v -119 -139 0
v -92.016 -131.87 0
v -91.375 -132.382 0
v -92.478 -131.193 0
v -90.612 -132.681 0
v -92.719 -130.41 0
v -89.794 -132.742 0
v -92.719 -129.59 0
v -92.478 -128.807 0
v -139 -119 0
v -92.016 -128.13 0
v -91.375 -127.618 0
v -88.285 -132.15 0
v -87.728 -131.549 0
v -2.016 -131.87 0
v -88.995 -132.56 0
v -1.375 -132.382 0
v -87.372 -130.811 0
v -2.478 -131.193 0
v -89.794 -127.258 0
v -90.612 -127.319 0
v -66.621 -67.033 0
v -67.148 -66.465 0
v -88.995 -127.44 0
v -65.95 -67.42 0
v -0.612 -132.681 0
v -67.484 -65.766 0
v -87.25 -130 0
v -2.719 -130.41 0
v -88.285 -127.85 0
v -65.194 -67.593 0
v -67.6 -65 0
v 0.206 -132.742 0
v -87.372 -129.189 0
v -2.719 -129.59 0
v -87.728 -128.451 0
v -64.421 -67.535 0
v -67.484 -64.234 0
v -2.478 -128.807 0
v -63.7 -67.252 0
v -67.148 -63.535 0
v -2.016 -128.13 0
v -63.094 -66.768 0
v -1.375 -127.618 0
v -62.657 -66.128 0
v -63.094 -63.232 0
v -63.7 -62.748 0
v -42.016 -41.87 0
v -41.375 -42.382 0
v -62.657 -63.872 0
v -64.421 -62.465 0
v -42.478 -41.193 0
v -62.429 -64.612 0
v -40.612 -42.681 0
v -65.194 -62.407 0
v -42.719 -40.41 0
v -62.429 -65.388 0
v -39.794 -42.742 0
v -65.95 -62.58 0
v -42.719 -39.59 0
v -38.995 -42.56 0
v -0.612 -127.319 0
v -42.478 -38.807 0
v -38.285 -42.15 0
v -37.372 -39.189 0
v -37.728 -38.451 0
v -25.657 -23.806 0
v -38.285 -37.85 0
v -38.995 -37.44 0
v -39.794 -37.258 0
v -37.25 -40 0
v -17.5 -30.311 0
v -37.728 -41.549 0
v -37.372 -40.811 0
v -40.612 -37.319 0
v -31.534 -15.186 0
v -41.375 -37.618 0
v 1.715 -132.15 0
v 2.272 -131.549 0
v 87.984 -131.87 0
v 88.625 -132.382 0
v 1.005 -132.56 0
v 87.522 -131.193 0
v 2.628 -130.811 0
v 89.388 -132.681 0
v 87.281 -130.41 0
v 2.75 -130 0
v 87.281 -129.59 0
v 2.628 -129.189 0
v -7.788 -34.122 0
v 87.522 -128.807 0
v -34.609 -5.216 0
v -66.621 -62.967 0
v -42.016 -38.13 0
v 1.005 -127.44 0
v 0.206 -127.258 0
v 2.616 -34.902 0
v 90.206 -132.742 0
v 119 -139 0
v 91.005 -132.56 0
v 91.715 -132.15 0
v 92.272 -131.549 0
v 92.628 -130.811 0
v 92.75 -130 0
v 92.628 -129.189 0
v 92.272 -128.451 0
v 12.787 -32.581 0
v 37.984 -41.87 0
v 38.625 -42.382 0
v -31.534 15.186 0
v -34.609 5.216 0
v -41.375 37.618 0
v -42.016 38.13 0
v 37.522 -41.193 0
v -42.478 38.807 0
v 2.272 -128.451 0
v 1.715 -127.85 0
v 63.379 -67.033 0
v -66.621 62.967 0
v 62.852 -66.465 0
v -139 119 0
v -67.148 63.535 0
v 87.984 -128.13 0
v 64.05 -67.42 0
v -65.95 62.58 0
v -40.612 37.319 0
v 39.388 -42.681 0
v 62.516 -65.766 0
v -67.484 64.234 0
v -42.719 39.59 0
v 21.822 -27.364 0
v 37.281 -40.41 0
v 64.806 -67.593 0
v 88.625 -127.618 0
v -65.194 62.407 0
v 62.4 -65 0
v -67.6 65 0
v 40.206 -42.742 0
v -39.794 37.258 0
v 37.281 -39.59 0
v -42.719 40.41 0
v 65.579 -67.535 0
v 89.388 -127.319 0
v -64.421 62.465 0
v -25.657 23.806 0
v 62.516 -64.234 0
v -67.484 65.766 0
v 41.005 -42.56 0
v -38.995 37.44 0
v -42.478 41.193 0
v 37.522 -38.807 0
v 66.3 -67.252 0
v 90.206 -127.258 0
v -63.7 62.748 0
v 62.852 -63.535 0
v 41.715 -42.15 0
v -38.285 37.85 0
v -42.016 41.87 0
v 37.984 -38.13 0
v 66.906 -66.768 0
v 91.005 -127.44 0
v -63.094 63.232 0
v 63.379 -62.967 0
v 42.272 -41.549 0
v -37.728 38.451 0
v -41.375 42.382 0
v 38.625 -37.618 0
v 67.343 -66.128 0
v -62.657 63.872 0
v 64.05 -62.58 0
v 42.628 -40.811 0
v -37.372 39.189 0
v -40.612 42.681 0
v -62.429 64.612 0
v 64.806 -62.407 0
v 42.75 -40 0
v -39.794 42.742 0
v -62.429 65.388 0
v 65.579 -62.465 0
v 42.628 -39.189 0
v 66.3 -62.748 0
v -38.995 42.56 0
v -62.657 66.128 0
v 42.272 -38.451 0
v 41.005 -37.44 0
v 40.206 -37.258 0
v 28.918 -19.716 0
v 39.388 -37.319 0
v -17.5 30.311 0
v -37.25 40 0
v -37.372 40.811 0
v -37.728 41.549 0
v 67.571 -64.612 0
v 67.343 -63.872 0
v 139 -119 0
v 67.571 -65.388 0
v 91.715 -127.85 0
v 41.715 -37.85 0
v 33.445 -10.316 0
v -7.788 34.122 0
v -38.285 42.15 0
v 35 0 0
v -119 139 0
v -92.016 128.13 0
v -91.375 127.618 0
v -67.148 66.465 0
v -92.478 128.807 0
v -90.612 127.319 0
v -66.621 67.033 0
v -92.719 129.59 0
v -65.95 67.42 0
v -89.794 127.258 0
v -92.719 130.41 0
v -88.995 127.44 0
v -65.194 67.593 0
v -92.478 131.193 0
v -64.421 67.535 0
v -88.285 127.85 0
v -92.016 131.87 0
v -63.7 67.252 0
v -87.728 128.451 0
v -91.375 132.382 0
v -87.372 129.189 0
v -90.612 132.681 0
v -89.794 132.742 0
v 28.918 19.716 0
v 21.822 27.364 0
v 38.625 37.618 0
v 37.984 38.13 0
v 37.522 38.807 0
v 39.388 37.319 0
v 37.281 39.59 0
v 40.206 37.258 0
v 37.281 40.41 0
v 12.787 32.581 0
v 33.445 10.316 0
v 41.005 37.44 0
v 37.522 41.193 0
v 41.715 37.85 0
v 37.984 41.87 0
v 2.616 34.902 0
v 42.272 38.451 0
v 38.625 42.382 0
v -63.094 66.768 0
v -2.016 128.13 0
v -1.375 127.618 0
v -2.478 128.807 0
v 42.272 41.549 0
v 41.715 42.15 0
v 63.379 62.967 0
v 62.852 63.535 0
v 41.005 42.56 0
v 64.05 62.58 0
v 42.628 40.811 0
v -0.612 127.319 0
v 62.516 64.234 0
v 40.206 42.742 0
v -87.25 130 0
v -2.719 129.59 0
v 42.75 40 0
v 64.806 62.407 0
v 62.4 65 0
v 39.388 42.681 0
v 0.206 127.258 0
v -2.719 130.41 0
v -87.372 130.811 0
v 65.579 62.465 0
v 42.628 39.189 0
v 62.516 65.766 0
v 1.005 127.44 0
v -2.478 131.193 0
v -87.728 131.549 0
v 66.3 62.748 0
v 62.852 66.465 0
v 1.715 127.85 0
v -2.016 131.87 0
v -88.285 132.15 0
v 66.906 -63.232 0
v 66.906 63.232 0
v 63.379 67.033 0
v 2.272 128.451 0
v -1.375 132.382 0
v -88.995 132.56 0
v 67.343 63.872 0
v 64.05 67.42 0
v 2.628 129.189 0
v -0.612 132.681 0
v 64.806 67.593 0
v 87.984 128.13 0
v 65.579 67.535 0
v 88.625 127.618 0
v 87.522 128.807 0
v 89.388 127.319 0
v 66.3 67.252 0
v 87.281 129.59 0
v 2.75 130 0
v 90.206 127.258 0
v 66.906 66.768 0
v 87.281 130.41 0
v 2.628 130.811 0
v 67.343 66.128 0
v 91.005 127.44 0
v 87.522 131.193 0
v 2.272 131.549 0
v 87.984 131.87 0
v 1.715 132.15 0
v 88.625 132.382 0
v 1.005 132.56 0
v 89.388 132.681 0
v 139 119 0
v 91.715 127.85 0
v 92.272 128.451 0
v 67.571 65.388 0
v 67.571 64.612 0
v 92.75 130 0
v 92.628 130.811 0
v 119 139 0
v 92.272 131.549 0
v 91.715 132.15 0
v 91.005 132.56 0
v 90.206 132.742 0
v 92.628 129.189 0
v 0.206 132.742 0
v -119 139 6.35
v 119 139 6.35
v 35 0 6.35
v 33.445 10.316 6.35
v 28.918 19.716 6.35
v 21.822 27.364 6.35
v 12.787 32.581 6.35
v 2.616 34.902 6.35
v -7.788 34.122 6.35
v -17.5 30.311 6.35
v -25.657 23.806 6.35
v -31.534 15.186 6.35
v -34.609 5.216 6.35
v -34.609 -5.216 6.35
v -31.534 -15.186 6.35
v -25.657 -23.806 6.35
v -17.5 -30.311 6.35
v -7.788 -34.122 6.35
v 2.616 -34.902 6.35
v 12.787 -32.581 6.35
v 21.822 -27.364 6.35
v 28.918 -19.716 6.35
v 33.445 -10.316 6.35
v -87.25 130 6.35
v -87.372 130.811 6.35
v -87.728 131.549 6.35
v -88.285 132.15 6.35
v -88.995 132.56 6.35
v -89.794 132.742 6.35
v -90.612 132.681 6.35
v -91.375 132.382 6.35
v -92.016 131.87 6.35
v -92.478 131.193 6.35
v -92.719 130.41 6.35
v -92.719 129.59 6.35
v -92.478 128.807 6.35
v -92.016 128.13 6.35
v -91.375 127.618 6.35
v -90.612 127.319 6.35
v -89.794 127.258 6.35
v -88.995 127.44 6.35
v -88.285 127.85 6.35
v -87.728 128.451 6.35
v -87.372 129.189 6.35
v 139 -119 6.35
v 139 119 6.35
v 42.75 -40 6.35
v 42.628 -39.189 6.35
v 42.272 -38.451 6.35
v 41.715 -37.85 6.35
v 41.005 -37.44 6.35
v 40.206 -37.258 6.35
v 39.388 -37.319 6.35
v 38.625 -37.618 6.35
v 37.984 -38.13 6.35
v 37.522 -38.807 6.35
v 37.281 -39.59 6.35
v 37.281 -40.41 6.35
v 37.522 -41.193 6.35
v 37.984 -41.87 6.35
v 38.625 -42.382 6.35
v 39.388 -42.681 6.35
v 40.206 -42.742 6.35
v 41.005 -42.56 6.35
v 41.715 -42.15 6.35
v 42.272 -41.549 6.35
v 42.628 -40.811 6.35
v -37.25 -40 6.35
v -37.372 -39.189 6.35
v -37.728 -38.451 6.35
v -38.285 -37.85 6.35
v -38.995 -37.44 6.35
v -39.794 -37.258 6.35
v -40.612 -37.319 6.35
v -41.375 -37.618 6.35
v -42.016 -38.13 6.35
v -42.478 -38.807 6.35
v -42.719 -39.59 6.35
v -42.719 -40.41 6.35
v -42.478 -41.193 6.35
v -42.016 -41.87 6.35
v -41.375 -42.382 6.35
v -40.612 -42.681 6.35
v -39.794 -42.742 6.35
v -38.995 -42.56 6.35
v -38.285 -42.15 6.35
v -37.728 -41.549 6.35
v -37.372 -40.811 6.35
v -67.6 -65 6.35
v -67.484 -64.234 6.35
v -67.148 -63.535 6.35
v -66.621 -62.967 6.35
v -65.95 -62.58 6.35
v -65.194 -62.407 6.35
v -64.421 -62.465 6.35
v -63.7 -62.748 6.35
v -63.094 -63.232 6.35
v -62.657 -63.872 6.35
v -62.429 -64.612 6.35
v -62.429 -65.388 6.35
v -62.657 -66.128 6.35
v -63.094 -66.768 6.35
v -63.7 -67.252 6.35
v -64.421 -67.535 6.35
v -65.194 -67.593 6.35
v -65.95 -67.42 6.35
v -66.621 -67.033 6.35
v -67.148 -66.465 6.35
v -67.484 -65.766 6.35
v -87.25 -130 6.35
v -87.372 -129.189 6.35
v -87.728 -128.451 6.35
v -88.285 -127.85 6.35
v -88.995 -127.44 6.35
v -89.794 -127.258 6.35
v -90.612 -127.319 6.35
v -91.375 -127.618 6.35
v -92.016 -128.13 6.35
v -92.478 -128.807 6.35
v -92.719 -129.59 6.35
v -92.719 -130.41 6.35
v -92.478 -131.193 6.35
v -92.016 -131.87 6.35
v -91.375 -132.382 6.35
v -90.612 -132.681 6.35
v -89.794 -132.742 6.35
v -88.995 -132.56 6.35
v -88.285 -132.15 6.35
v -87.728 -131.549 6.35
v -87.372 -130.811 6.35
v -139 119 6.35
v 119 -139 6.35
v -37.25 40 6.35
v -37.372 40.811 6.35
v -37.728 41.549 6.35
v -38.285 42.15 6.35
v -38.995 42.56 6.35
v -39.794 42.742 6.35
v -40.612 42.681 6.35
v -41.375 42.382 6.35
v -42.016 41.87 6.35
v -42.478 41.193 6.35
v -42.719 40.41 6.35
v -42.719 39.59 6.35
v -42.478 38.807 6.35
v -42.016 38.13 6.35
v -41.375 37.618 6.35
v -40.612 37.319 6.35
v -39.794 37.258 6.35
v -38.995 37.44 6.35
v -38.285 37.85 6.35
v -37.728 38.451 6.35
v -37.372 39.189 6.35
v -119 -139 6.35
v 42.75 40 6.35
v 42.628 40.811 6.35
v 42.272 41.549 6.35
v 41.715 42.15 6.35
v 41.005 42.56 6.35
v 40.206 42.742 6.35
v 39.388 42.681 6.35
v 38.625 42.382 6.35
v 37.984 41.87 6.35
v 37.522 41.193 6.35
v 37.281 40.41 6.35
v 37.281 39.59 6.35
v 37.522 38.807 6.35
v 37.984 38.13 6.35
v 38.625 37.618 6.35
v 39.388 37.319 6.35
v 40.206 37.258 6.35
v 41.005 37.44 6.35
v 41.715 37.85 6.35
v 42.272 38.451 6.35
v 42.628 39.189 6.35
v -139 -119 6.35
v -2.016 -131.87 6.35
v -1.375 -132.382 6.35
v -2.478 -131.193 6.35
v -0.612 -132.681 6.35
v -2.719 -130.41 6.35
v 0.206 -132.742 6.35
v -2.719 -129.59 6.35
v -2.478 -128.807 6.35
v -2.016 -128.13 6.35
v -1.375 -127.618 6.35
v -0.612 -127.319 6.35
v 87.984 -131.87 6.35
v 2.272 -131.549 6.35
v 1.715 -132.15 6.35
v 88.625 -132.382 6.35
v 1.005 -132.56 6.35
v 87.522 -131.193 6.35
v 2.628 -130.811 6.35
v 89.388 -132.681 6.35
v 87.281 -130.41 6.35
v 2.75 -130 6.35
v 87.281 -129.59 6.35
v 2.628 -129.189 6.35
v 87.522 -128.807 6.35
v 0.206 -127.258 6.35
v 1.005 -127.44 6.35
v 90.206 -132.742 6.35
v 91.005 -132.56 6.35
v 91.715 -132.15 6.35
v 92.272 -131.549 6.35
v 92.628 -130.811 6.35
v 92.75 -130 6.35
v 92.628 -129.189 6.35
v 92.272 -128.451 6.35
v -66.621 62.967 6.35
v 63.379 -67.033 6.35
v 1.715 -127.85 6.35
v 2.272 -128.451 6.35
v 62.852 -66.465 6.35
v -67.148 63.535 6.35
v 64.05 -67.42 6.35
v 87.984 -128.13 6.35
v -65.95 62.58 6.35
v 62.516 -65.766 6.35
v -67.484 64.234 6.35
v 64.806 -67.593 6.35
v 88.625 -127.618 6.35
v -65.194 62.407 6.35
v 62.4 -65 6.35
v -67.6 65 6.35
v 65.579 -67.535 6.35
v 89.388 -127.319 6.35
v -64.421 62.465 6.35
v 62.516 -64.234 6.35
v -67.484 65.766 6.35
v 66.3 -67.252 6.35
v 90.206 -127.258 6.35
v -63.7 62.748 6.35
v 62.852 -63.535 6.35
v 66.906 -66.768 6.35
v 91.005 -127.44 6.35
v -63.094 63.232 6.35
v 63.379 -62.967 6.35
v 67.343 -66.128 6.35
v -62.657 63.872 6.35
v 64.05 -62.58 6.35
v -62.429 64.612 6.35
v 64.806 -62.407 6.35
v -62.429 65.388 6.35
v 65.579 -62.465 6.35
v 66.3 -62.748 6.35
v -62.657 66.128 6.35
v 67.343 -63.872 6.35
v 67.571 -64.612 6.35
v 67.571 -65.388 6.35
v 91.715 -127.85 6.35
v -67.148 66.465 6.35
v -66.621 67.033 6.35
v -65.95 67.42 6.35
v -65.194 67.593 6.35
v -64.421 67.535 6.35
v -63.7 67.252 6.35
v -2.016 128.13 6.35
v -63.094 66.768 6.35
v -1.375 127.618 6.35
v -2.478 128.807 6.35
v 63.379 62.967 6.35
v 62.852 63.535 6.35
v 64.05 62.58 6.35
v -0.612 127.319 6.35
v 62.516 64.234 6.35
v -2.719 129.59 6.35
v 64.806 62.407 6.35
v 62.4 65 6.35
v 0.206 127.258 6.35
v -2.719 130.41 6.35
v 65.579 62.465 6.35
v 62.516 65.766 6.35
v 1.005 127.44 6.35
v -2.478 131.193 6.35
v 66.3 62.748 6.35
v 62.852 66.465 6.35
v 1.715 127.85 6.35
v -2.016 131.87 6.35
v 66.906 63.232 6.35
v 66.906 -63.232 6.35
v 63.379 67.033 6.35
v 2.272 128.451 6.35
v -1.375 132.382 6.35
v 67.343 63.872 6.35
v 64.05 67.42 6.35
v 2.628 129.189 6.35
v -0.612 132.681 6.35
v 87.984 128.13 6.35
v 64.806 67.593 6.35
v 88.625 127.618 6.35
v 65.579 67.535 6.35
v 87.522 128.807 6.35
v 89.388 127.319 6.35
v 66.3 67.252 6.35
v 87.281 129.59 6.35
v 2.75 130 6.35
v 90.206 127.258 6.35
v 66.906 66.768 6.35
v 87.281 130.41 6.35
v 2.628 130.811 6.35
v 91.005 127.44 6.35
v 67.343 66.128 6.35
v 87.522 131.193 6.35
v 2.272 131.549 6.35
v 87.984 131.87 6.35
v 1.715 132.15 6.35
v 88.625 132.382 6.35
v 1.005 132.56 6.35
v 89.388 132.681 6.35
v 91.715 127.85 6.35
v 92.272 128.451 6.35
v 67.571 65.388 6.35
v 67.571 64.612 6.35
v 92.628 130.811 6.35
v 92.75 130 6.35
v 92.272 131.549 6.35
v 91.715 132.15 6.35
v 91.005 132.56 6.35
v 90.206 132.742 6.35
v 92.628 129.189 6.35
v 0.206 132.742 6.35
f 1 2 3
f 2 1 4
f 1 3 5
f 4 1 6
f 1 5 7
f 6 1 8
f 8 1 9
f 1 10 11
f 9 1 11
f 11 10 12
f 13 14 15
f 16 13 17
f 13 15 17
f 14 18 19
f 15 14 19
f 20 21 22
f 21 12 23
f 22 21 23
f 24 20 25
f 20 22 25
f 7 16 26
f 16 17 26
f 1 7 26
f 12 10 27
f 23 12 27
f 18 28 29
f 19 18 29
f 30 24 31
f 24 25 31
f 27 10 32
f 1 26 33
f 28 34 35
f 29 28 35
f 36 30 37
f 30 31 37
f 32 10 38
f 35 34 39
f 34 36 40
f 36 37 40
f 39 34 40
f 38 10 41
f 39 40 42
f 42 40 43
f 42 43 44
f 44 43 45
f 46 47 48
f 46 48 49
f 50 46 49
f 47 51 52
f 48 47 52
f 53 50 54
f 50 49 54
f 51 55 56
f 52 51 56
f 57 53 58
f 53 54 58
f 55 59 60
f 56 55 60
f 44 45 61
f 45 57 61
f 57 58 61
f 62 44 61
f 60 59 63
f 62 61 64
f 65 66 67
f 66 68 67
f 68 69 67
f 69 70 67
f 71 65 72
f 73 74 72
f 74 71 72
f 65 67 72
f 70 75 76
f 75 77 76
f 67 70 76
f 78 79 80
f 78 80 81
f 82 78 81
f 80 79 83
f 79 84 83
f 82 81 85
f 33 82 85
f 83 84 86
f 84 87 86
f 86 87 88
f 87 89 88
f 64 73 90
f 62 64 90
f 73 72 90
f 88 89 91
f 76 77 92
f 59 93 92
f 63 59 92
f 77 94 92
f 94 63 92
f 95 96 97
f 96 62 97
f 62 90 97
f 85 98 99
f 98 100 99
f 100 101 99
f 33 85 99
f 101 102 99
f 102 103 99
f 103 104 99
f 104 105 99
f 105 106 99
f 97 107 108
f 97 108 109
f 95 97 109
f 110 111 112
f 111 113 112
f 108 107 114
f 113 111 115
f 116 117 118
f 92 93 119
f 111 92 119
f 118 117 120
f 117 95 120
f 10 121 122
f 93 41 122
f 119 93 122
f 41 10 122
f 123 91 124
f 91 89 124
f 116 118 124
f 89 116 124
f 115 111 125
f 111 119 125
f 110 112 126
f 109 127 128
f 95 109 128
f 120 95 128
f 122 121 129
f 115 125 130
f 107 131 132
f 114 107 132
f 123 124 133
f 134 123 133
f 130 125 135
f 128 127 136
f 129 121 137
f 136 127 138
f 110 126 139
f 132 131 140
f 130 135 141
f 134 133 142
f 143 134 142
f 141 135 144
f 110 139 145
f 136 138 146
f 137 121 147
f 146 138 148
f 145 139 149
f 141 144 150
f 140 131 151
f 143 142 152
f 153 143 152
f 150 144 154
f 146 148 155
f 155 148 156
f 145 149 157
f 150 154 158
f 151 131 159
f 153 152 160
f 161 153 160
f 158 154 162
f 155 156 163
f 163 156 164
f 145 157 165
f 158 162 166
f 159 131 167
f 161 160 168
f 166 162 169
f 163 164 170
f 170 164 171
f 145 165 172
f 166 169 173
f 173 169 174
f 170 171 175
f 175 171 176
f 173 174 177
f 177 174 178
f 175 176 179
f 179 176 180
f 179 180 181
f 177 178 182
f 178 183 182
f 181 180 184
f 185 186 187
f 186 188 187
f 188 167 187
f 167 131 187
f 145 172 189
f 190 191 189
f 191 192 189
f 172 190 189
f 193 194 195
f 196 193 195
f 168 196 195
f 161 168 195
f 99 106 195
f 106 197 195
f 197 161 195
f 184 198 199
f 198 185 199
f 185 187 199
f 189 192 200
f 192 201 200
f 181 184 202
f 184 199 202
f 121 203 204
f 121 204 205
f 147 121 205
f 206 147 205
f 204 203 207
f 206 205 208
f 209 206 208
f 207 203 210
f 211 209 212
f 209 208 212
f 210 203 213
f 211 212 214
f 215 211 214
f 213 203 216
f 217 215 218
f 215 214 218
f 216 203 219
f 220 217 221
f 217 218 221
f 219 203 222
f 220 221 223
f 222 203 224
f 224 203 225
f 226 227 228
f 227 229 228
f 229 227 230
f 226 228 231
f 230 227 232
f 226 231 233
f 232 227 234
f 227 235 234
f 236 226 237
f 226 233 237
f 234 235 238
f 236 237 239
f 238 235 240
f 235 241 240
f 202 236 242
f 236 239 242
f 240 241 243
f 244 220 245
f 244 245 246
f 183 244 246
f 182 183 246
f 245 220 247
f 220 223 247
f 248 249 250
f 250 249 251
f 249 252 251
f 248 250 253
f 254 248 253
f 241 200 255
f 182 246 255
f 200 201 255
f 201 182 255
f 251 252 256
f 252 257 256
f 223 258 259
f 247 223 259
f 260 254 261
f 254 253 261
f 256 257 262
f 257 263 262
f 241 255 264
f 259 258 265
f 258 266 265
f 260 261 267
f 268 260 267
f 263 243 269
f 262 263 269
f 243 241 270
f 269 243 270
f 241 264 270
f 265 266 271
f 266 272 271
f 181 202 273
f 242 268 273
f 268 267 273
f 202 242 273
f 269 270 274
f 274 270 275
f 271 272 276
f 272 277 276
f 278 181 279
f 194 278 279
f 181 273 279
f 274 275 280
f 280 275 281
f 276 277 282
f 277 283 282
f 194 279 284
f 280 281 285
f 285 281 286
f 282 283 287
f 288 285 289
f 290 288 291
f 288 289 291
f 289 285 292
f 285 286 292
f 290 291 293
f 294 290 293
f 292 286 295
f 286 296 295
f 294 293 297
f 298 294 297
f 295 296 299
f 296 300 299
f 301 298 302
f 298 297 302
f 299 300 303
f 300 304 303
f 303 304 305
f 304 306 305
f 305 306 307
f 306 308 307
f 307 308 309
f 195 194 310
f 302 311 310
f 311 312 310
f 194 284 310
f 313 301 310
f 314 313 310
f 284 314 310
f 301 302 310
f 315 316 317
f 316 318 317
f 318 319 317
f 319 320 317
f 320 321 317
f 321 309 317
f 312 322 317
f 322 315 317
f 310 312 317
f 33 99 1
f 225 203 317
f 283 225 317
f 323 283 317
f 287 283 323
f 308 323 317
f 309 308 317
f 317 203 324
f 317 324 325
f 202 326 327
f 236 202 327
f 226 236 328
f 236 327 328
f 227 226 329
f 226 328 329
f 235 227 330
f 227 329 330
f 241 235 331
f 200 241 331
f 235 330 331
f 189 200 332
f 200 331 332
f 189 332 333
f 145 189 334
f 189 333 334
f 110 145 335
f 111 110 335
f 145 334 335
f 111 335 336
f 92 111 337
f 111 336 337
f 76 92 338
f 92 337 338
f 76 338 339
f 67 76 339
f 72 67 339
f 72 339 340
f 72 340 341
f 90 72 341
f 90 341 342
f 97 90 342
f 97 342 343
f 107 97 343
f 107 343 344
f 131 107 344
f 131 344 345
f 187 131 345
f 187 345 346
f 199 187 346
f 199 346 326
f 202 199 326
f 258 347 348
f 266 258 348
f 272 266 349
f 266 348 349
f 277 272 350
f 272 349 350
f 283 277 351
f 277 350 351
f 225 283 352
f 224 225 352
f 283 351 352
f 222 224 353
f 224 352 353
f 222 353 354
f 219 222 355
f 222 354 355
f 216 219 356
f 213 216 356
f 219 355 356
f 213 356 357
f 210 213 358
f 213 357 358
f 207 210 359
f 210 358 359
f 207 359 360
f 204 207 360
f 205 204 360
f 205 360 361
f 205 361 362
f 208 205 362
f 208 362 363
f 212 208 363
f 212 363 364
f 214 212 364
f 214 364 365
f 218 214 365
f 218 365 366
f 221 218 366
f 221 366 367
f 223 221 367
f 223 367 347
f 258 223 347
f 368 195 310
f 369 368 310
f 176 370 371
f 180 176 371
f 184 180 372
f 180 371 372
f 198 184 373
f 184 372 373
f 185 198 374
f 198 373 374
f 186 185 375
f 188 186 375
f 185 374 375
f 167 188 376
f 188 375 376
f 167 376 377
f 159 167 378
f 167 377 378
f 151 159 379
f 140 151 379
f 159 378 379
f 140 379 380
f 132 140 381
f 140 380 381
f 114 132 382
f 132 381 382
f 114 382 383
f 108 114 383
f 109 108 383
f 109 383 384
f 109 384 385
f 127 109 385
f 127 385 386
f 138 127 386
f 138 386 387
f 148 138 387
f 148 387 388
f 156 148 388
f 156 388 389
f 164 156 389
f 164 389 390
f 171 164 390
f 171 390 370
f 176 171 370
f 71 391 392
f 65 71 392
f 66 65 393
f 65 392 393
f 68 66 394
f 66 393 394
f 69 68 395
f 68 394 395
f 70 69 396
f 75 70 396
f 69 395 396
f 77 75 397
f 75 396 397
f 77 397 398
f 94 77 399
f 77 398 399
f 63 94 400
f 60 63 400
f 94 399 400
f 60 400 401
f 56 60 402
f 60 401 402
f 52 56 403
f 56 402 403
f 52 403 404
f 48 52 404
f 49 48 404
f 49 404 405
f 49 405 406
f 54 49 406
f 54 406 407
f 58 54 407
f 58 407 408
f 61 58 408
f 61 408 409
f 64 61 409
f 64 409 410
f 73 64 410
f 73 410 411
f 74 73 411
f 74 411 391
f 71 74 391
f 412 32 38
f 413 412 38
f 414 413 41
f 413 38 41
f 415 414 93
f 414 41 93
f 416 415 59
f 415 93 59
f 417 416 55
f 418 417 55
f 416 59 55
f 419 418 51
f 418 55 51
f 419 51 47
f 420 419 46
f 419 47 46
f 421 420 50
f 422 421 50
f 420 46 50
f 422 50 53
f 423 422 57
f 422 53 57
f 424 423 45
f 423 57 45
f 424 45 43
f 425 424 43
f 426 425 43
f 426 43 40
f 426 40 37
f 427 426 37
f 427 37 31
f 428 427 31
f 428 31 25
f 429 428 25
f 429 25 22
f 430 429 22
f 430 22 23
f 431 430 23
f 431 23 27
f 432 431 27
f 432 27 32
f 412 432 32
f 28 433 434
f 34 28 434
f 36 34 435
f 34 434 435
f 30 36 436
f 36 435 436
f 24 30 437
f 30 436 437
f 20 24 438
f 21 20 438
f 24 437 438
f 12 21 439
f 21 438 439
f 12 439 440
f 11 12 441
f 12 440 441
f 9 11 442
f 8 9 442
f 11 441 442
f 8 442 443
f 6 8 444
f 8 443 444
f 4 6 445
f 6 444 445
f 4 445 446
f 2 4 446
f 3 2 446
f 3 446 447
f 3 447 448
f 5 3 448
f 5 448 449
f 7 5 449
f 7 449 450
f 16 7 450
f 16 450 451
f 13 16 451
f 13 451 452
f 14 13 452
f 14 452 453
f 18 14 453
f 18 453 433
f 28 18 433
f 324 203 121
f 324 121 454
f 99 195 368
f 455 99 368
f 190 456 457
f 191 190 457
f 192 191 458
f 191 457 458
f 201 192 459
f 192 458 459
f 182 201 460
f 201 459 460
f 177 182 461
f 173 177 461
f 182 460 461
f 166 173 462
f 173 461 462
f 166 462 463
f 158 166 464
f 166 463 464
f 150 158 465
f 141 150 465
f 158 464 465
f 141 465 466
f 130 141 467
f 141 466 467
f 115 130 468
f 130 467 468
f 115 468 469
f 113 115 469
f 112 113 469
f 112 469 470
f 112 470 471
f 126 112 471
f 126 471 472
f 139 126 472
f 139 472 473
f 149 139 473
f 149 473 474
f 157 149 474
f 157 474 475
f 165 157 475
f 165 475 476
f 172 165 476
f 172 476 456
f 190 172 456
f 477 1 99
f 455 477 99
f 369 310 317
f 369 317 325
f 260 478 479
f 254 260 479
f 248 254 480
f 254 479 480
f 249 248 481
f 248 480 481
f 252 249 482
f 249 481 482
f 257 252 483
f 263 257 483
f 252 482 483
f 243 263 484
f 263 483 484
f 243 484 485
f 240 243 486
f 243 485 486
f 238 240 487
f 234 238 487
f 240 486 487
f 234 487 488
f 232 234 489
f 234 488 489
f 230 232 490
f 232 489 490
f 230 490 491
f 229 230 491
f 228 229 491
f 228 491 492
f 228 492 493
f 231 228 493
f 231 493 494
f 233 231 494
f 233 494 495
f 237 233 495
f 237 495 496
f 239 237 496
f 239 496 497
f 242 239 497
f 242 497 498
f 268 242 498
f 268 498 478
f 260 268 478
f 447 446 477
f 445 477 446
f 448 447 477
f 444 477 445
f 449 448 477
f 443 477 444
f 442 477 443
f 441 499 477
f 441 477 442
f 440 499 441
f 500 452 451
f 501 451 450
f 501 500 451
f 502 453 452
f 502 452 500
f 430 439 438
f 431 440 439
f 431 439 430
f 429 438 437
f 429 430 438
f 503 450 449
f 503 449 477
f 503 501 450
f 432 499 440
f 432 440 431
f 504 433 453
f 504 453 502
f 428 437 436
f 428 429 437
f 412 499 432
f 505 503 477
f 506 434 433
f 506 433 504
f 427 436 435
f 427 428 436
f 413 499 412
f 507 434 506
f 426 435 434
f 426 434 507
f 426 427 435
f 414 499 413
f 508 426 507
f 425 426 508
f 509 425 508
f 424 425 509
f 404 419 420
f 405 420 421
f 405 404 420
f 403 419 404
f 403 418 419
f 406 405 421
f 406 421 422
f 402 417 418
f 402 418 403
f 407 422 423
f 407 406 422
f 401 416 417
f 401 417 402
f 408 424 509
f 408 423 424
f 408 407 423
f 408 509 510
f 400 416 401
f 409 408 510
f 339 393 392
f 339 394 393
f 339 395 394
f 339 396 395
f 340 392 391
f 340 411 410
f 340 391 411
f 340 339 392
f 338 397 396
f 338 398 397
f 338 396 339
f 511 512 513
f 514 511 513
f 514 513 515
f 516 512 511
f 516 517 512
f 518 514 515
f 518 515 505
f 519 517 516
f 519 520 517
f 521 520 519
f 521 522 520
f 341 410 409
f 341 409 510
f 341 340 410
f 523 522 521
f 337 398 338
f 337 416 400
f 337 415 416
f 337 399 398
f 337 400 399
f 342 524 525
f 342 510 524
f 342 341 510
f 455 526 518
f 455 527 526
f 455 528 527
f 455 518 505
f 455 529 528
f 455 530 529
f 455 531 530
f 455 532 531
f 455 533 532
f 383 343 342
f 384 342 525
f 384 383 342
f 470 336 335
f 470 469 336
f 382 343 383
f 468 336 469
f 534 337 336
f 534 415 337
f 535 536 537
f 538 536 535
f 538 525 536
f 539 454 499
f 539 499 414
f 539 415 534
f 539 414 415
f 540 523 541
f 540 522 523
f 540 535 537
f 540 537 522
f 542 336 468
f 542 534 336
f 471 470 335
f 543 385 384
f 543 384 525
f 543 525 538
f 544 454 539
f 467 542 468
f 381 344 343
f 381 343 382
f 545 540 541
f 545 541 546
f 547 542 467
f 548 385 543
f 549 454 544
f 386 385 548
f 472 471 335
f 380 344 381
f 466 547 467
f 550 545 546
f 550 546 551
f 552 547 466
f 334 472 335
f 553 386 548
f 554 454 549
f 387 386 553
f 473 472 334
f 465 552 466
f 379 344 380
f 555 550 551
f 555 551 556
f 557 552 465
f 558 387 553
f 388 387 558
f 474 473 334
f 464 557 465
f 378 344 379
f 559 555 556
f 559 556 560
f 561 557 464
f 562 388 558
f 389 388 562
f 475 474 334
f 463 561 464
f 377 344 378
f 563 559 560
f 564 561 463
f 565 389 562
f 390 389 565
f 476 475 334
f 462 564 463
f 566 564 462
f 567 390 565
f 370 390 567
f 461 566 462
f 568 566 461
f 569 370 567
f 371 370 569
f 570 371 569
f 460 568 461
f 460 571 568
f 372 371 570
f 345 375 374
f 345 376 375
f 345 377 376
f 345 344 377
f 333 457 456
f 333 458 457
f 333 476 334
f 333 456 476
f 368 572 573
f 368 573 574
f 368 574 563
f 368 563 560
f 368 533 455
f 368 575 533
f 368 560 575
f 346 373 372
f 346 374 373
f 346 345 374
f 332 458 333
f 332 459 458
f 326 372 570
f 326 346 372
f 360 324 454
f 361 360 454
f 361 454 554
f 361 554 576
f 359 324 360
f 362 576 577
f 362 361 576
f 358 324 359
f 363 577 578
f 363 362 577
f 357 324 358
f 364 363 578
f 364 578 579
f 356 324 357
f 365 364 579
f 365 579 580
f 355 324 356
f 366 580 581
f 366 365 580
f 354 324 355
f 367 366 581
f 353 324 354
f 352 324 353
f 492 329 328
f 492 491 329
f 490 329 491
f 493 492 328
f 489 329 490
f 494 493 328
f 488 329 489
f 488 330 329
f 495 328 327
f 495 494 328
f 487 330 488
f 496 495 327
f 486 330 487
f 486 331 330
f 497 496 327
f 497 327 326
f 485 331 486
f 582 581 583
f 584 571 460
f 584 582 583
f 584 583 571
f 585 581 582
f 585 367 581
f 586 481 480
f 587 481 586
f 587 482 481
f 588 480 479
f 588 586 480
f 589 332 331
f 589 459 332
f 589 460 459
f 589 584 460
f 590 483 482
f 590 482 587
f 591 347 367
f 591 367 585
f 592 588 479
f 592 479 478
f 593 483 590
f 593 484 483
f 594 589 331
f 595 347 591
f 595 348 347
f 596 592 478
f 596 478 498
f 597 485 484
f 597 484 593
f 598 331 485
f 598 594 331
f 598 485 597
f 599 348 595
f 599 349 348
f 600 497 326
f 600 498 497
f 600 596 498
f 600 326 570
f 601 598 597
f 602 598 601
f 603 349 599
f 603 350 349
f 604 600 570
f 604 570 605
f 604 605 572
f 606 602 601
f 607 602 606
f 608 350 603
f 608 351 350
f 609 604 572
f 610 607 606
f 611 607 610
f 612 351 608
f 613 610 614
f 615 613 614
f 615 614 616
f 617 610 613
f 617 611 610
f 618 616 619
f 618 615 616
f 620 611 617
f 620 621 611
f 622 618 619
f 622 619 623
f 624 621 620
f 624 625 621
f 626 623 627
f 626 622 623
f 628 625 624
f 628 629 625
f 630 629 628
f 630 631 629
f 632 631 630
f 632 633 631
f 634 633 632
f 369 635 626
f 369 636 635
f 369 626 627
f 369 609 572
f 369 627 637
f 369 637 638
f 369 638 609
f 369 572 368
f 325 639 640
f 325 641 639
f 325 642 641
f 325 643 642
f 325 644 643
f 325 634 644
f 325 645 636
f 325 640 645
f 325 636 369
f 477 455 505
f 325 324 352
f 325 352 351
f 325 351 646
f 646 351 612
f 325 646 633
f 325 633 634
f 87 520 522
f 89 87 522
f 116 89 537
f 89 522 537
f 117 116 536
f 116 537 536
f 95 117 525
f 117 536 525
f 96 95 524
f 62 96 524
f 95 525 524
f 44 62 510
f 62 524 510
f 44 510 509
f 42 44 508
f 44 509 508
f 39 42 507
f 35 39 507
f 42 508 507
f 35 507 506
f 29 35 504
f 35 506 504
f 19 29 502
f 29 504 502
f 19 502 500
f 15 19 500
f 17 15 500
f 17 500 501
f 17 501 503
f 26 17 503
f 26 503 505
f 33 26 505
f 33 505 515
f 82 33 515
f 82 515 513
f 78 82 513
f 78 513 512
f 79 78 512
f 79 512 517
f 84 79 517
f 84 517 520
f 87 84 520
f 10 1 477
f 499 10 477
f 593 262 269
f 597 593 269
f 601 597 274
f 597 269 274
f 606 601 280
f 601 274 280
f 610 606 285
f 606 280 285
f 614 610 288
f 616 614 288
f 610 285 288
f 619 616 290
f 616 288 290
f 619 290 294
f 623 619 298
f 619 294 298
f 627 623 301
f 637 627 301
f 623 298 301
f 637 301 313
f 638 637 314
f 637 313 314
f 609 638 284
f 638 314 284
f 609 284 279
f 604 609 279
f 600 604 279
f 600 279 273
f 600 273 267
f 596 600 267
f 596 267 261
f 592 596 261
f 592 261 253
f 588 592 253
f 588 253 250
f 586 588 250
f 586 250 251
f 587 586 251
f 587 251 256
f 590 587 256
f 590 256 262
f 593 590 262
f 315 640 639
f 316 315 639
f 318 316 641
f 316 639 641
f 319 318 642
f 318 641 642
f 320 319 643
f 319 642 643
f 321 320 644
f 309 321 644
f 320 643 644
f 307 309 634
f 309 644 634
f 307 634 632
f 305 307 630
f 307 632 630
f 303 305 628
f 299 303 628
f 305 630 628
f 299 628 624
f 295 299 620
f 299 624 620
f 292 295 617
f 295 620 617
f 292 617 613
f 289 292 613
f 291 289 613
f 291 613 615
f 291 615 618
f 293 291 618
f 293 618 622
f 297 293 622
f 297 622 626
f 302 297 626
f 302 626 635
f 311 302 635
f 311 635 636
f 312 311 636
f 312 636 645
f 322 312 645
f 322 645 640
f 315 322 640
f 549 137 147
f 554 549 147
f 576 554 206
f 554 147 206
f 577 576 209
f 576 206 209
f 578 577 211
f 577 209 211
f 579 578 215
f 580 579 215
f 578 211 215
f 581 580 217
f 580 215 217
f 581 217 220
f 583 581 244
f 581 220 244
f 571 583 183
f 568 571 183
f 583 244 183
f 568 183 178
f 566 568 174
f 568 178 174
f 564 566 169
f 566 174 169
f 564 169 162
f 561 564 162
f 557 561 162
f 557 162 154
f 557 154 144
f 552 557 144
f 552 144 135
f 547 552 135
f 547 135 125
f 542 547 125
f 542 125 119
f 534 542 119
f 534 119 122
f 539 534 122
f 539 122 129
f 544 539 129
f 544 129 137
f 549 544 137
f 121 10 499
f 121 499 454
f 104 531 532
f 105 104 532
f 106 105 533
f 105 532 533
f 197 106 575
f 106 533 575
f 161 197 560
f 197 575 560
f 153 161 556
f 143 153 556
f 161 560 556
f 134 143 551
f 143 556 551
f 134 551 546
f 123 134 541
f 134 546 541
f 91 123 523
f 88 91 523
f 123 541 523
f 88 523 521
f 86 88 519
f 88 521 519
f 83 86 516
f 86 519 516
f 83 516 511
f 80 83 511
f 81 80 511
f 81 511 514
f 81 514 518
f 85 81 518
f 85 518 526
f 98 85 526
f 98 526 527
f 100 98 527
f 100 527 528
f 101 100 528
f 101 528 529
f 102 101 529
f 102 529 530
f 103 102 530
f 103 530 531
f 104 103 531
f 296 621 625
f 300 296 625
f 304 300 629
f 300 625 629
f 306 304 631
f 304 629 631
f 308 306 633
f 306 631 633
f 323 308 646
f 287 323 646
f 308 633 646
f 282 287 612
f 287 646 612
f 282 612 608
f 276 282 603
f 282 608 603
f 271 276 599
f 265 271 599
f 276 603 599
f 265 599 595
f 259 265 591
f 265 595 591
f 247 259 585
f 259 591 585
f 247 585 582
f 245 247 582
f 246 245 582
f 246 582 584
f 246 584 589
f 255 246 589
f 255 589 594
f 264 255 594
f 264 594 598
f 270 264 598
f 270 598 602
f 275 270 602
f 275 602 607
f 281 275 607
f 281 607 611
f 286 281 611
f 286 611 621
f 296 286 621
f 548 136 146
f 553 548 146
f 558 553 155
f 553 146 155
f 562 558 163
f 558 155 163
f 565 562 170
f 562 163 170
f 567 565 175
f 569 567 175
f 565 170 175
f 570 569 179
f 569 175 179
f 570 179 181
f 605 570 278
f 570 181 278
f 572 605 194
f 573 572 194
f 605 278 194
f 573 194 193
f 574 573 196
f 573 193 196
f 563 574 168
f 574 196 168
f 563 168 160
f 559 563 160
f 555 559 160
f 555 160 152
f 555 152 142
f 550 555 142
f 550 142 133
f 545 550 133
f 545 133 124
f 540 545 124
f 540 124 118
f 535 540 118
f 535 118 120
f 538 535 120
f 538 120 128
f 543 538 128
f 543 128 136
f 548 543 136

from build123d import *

# Parameters (mm, degrees)
SKETCH1_W           = 278
SKETCH1_H           = 278
BOSS_EXTRUDE1_DEPTH = 6.35
SKETCH2_R           = 35
SKETCH2_R_2         = 2.75
CUT_EXTRUDE1_DEPTH  = 7.35
CHAMFER1_SIZE       = 20
SKETCH4_R           = 2.75
CUT_EXTRUDE2_DEPTH  = 76.2
SKETCH6_R           = 2.6
CUT_EXTRUDE4_DEPTH  = 7.35


with BuildPart() as part:
    # Sketch1 → Boss-Extrude1 (new body)
    with BuildSketch(Plane.XY):
        Rectangle(SKETCH1_W, SKETCH1_H)
    extrude(amount=BOSS_EXTRUDE1_DEPTH)

    # Sketch2 → Cut-Extrude1 (cut, through all)
    with BuildSketch(Plane.XY.offset(6.35)):
        Circle(SKETCH2_R)
        with Locations((-40, 40)):
            Circle(SKETCH2_R_2)
        with Locations((40, 40)):
            Circle(SKETCH2_R_2)
        with Locations((40, -40)):
            Circle(SKETCH2_R_2)
        with Locations((-40, -40)):
            Circle(SKETCH2_R_2)
    extrude(amount=-CUT_EXTRUDE1_DEPTH, mode=Mode.SUBTRACT)

    # Chamfer1
    chamfer1_edges = [part.edges().sort_by_distance(p)[0] for p in [
        (-139, 139, 3.175),
        (139, 139, 3.175),
        (139, -139, 3.175),
        (-139, -139, 3.175),
    ]]
    chamfer(chamfer1_edges, length=CHAMFER1_SIZE)

    # Sketch4 → Cut-Extrude2 (cut)
    with BuildSketch(Plane.XY.offset(6.35)):
        with Locations((-90, 130)):
            Circle(SKETCH4_R)
        with Locations((0, 130)):
            Circle(SKETCH4_R)
        with Locations((90, 130)):
            Circle(SKETCH4_R)
        with Locations((90, -130)):
            Circle(SKETCH4_R)
        with Locations((0, -130)):
            Circle(SKETCH4_R)
        with Locations((-90, -130)):
            Circle(SKETCH4_R)
    extrude(amount=-CUT_EXTRUDE2_DEPTH, mode=Mode.SUBTRACT)

    # Sketch6 → Cut-Extrude4 (cut, through all)
    with BuildSketch(Plane(origin=(0, 0, 0), x_dir=(-1, 0, 0), z_dir=(0, 0, -1))):
        with Locations((65, 65)):
            Circle(SKETCH6_R)
        with Locations((65, -65)):
            Circle(SKETCH6_R)
        with Locations((-65, -65)):
            Circle(SKETCH6_R)
        with Locations((-65, 65)):
            Circle(SKETCH6_R)
    extrude(amount=-CUT_EXTRUDE4_DEPTH, mode=Mode.SUBTRACT)


solid = part.part
